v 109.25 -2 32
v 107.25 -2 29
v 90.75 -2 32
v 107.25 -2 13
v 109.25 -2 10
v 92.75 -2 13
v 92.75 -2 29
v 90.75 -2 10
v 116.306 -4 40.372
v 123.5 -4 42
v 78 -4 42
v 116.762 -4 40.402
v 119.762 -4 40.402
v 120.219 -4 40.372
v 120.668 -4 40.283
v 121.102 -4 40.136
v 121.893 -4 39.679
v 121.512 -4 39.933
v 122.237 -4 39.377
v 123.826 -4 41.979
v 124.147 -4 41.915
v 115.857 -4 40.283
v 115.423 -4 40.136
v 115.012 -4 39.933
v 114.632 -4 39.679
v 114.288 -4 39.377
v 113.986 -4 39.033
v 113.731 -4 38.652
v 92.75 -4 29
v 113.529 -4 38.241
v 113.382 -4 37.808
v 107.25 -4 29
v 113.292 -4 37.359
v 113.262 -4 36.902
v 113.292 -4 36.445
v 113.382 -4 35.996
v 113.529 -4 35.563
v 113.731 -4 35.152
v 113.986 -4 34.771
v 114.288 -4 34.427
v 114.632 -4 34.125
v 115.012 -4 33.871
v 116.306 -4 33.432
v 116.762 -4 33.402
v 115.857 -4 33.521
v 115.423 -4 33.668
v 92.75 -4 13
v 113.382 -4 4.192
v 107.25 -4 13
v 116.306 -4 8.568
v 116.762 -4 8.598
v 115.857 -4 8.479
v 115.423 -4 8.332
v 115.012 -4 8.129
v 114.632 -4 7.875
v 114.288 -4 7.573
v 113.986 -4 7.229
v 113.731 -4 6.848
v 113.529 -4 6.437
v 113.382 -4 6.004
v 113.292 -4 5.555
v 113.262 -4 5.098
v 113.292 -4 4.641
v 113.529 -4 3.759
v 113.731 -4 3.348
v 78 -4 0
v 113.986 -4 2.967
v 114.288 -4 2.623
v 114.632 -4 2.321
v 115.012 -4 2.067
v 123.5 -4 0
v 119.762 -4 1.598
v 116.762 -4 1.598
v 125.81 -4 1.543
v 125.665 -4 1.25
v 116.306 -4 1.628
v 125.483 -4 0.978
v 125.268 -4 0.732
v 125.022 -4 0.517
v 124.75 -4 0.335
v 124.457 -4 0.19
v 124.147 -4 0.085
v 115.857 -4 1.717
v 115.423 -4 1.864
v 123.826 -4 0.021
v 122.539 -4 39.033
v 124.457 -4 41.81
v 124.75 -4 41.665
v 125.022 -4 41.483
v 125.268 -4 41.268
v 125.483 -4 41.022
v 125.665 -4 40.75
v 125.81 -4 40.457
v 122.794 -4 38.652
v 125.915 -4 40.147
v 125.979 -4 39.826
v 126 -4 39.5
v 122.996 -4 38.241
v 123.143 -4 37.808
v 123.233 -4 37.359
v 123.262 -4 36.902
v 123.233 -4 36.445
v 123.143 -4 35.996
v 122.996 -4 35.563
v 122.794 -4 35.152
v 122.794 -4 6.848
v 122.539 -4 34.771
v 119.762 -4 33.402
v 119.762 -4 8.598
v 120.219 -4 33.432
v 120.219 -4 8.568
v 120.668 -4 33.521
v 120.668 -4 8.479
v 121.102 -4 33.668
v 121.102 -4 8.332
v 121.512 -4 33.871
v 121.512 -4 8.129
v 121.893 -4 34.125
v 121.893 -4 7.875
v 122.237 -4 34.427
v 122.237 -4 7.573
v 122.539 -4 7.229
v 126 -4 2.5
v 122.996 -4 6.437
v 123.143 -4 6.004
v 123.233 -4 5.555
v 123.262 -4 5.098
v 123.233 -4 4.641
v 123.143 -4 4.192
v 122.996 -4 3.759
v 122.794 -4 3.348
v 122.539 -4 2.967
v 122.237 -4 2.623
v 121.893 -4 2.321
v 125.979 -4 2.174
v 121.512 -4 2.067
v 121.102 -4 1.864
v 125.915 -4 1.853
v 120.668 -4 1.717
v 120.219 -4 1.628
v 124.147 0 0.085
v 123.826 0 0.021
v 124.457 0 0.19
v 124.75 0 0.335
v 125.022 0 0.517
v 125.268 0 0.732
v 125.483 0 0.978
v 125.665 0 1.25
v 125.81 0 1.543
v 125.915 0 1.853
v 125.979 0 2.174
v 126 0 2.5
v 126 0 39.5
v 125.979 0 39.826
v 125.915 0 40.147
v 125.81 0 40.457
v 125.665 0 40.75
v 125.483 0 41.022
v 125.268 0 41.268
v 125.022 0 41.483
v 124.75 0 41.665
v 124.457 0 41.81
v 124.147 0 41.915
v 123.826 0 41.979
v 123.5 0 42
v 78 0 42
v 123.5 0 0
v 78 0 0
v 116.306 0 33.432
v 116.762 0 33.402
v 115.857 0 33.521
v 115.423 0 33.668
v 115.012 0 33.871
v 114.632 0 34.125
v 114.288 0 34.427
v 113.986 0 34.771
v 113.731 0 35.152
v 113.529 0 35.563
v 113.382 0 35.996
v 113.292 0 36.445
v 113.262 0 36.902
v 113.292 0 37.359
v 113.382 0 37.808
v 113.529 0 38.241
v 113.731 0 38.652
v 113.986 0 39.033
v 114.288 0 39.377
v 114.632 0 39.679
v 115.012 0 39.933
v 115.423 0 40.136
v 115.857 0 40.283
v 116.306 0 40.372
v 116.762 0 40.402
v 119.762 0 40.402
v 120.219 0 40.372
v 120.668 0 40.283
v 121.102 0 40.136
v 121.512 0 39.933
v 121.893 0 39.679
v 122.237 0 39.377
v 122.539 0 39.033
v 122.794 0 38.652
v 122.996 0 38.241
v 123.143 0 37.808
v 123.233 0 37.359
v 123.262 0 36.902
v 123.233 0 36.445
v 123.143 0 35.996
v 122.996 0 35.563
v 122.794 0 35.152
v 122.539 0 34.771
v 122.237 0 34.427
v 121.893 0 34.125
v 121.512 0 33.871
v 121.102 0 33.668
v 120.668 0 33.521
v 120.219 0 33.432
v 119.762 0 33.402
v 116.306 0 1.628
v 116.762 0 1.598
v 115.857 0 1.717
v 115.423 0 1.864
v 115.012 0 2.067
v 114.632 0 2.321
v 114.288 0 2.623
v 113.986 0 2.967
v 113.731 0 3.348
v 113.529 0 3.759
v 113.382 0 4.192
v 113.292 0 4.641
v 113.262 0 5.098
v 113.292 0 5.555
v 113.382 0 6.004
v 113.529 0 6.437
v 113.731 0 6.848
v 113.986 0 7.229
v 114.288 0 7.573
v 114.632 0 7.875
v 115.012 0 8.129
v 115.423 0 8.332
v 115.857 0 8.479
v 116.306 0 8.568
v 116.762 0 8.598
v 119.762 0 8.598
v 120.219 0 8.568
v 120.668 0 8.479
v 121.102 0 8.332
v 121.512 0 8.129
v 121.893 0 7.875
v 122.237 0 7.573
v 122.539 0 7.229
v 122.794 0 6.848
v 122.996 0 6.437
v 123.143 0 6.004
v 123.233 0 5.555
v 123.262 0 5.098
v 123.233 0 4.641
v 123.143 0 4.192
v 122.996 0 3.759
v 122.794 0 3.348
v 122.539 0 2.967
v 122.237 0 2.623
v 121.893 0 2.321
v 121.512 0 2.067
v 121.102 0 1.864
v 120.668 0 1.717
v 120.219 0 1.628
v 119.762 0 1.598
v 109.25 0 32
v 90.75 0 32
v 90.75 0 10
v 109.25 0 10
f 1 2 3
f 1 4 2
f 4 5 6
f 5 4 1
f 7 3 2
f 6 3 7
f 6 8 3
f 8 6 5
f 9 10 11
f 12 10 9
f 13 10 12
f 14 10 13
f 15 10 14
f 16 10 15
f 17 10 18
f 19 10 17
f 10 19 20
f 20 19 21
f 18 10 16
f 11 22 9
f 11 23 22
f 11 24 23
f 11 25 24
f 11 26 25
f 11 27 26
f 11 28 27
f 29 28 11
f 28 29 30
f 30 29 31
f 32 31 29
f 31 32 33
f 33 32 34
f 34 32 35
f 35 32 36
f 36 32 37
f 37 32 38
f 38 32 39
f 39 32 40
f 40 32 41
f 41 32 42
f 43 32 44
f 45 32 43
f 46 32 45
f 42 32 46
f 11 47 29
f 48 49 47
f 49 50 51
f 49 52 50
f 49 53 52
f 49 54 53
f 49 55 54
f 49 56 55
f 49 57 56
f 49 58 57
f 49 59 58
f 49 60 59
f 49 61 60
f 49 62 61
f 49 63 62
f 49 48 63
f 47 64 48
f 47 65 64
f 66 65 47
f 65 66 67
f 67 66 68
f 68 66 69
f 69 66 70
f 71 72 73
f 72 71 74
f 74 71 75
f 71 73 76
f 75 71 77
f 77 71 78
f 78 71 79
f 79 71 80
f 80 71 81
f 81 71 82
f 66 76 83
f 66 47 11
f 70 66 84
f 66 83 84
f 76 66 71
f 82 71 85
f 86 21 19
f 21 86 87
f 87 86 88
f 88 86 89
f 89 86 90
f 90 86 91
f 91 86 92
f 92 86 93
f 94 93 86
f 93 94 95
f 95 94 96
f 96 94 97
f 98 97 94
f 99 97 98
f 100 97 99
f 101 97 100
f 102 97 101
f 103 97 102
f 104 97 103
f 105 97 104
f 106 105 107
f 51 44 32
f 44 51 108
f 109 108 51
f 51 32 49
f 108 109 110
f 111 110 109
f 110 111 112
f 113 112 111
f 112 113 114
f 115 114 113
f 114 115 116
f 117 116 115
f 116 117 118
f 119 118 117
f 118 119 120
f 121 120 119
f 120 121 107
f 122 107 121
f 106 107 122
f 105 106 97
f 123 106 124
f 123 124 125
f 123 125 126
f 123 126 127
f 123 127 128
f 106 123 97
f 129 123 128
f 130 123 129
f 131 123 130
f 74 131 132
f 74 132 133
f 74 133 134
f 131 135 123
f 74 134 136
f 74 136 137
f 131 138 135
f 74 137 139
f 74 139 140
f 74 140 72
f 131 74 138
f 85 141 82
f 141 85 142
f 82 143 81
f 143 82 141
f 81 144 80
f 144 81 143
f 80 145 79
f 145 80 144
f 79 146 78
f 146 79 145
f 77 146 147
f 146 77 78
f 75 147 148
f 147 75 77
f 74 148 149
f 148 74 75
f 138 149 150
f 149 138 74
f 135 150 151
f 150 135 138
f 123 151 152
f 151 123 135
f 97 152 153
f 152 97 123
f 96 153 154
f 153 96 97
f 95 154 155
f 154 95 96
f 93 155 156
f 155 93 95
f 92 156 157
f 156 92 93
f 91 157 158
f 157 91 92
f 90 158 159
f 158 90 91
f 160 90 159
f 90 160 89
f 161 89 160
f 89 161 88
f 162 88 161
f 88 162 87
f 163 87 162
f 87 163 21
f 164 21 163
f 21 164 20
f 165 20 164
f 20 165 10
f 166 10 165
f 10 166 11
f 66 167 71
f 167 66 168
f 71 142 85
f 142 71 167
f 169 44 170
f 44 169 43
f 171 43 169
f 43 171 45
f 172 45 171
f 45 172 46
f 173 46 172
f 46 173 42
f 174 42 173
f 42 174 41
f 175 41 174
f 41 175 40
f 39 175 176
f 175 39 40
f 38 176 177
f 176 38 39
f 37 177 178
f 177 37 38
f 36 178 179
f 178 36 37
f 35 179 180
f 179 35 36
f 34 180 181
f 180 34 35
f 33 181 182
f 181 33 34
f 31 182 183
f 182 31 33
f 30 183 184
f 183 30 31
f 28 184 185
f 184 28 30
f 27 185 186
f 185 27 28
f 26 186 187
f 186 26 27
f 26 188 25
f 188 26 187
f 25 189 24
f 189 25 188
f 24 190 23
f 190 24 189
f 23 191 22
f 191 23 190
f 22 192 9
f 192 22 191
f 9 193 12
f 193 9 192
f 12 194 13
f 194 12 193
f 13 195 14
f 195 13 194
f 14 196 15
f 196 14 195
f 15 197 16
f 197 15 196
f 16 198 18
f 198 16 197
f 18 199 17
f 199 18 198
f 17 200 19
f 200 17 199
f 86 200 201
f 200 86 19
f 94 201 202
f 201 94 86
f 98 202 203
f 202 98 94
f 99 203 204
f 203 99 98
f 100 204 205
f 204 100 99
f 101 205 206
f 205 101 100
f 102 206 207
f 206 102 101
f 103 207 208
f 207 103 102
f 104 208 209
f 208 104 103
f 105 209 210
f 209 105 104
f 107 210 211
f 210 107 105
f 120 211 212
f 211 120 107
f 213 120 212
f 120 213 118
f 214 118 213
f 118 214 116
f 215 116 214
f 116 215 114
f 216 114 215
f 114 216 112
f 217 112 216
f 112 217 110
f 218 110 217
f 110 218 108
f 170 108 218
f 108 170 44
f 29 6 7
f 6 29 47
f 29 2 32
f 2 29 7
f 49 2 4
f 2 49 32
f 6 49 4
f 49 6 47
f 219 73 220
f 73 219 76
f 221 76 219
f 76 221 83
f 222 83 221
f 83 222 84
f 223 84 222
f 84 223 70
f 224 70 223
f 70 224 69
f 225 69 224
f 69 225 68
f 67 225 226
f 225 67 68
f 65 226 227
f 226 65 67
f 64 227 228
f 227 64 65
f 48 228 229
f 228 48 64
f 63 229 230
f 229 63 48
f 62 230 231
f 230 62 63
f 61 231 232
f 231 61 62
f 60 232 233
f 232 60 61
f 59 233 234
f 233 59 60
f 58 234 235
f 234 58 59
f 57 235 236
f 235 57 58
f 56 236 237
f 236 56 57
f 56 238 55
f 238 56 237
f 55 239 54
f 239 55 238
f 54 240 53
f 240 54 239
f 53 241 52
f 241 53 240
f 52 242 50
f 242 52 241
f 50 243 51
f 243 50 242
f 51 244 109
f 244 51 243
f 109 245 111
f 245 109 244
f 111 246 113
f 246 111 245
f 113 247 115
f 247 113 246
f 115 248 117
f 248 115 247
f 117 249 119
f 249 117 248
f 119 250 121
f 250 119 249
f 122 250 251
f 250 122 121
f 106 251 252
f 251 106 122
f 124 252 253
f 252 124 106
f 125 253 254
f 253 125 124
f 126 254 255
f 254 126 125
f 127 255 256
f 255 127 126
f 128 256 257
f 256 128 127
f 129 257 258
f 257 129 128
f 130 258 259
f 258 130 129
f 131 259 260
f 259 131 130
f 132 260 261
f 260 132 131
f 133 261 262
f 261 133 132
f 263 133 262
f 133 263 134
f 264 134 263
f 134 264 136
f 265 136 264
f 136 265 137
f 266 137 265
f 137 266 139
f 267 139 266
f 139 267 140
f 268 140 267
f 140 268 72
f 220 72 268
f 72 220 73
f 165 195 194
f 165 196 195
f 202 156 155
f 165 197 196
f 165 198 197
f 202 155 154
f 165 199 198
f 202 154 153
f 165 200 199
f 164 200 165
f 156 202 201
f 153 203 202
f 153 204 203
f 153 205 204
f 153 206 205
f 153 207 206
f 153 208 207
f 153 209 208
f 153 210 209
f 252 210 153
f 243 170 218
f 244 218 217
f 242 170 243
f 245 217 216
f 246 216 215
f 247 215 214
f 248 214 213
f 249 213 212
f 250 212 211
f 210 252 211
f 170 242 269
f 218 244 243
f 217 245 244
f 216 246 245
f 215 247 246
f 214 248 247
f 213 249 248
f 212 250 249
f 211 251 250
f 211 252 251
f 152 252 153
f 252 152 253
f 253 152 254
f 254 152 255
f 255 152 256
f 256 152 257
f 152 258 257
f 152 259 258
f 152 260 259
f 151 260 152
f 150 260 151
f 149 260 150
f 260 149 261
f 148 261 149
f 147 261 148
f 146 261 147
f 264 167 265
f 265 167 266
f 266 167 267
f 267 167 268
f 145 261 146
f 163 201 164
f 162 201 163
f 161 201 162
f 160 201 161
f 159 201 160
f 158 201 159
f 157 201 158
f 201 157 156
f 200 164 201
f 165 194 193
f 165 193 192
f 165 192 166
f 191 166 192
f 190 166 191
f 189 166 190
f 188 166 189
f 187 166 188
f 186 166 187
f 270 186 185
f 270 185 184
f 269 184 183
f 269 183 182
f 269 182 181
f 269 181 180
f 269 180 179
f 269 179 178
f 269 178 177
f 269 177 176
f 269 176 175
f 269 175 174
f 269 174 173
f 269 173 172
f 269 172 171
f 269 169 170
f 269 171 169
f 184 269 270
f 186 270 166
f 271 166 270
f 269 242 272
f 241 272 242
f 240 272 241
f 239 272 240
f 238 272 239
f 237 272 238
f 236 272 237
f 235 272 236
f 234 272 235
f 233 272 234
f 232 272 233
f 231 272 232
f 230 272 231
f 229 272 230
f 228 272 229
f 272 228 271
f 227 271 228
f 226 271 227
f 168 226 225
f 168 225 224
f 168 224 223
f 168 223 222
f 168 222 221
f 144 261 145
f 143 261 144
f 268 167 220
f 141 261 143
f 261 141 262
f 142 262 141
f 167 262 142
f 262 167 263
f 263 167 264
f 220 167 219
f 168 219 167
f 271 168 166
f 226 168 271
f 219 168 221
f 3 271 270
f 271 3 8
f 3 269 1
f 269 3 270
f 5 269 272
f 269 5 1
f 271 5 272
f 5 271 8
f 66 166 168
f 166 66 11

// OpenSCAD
// Lab Rax generic equipment tray + faceplate (wizard template).
// Faceplate derived from the Pi4 baseline; rack holes follow the four-corner layout of the user-supplied
// 1U blank plate (faceplate_mounting.json): EVERY rack unit gets 4 holes, never a single centre pair.
// The wizard appends override assignments at the end of this file.
// PROPOSED, UNVALIDATED: printed fit, strength and rack clearance are UNKNOWN.
$fn=48;
part="assembly";            // assembly, faceplate, tray, combined, rear_bracket
// Device envelope (mm). Origin of hole coordinates = device front-left corner, seen from above.
dev_w=85; dev_d=56; dev_h=20;
holes=[];                   // [[x,y],...] mounting hole centres
hole_d=2.7;                 // device mounting hole diameter
device_mount="inserts";     // inserts, pegs, clips, straps
standoff=6;                 // device lift above tray floor
insert_pilot=3.2;           // pilot for heat-set insert (inserts mode)
board_t=1.6;                // board/flange thickness (pegs, clips)
joint="screw";              // screw, snap, single
u=1;                        // faceplate height in rack units
keystones=[];               // [x,...] keystone centres on faceplate (X=0 centre)
ks_w=14.5; ks_h=16;         // standard keystone opening
ports=[];                   // [[x,z,w,h,r],...] faceplate cut-outs, z from plate bottom, r=corner radius
front_gap=12;               // device front to faceplate rear face
margin=8;                   // tray border around device
rear_support=false;         // heavy/deep equipment: tray runs to the rear posts and screws to a rear bracket
coupon=[];                  // test coupon: [x0,x1,ymax] keeps only that slice of the part

// 4 mm plate (owner default 2026-10-18). Corner radius is limited by the four-corner holes:
// the reference holes sit 1.6 mm from the top/bottom edge, so larger corners would cut into them.
plate_w=252; plate_t=4; plate_r=2.5; plate_h=u*44.45-2.45;
hole_x=118.2625; hole_dz=15.902;   // each U: holes at its centre ±hole_dz (5.098 / 36.902 on a 1U plate)
rack_depth=240;             // Lab Rax frame depth (front of front posts to back of rear posts)
nudge=0;                    // render-repair only: tiny size offset applied when OpenSCAD 2021 emits a sliver
ks_front=2;                 // keystone clips need a thin wall: plate is pocketed from behind down to this
tray_t=3; tray_z=7;
tray_w=dev_w+2*margin; tray_d=rear_support?rack_depth:dev_d+front_gap+margin;
tray_x=-tray_w/2; tray_y=0;
dev_x=-dev_w/2; dev_y=front_gap; floor_top=tray_z+tray_t;
jx=min(40,tray_w/2-12); joint_x=[-jx,jx];
tongue_w=12; tongue_depth=7; tongue_h=3; tongue_z=tray_z+3.5;
slot_clear=0.3; boss_d=9; m3_clear=3.4; joint_pilot=4.0;  // 4.0 = the printed, well-fitting Pi4 trial

module capsule2d(len=10,diam=7){hull(){translate([-(len-diam)/2,0])circle(d=diam);translate([(len-diam)/2,0])circle(d=diam);}}
module rrect(w,h,r){rr=min(r,w/2-0.01,h/2-0.01);if(rr<=0)square([w,h],center=true);else offset(r=rr)square([w-2*rr,h-2*rr],center=true);}
// Mirror front-of-tray features to the rear (about the rack's mid-depth).
module to_rear(){translate([0,rack_depth/2,0])mirror([0,1,0])translate([0,-rack_depth/2,0])children();}

// Faceplate outline seen from the front: 2D X = rack X, 2D Y = height Z.
// rear=true cuts the larger keystone pocket; plain=true leaves out keystones/ports (rear bracket).
module plate2d(rear=false,plain=false){
 difference(){
  hull()for(sx=[-1,1],sz=[-1,1])translate([sx*(plate_w/2-plate_r),plate_h/2+sz*(plate_h/2-plate_r)])circle(r=plate_r+nudge);
  for(i=[0:u-1],dz=[-hole_dz,hole_dz],x=[-hole_x,hole_x])translate([x,i*44.45+21+dz])capsule2d();
  if(!plain){
   for(x=keystones)if(rear)translate([x,plate_h/2])square([ks_w+4+nudge,ks_h+6+nudge],center=true);
                   else translate([x,plate_h/2])square([ks_w,ks_h],center=true);
   for(p=ports)translate([p[0],p[1]])rrect(p[2],p[3],p[4]);
  }
 }
}
// Plate between y=y0 (front) and y0+t, built from the 2D outline (cleaner meshes than 3D cuts in OpenSCAD 2021).
module plate_layer(y0,t,rear=false,plain=false){translate([0,y0+t,0])rotate([90,0,0])linear_extrude(height=t)plate2d(rear,plain);}

module plate_joint_add(){
 if(joint=="screw"){
  for(x=joint_x)translate([x-tongue_w/2,0,tongue_z])cube([tongue_w,tongue_depth,tongue_h]);
  for(x=joint_x)translate([x,0,tray_z+14])rotate([-90,0,0])cylinder(d=boss_d,h=8);
 }
 if(joint=="snap") for(x=joint_x){
  // Cantilever arm under the tray floor; barb snaps up into a floor window.
  translate([x-4,0,tray_z-2])cube([8,16,2]);
  translate([x-4,12,tray_z])hull(){cube([8,4,0.01]);translate([0,3.4,0])cube([8,0.6,1.2]);}
 }
}
module plate_joint_cut(){if(joint=="screw")for(x=joint_x)translate([x,-0.1,tray_z+14])rotate([-90,0,0])cylinder(d=joint_pilot,h=8.2);}

module faceplate(){
 difference(){
  union(){
   // Front layer keeps the keystone opening; with keystones, the rear layer is pocketed so jacks grip ks_front.
   if(len(keystones)>0&&plate_t>ks_front){plate_layer(-plate_t,ks_front);plate_layer(-plate_t+ks_front,plate_t-ks_front,true);}
   else plate_layer(-plate_t,plate_t);
   plate_joint_add();
  }
  plate_joint_cut();
 }
}
// Plain plate on the rear posts (mirror of the faceplate, no openings) that the tray's rear end screws/snaps to.
module rear_bracket(){to_rear()difference(){union(){plate_layer(-plate_t,plate_t,false,true);plate_joint_add();}plate_joint_cut();}}

module device_features_add(){
 if(device_mount=="inserts")for(h=holes)translate([dev_x+h[0],dev_y+h[1],floor_top])cylinder(d=max(insert_pilot+3.5,7),h=standoff);
 if(device_mount=="pegs")for(h=holes)translate([dev_x+h[0],dev_y+h[1],floor_top]){
  cylinder(d=hole_d+3,h=standoff);
  translate([0,0,standoff])cylinder(d=hole_d-0.3,h=board_t+0.8);
  translate([0,0,standoff+board_t+0.8])cylinder(d1=hole_d-0.3,d2=hole_d-1,h=0.8);
 }
 if(device_mount=="clips"){
  // Support ledges at the four corners plus a flexing clip on each side.
  for(x=[dev_x-1,dev_x+dev_w-5],y=[dev_y-1,dev_y+dev_d-5])translate([x,y,floor_top])cube([6,6,standoff]);
  for(s=[-1,1])translate([s>0?dev_x+dev_w+0.2:dev_x-2.2,dev_y+dev_d/2-5,floor_top]){
   cube([2,10,standoff+board_t+2.5]);
   translate([s>0?-1.2:2,0,standoff+board_t+0.2])hull(){cube([1.2,10,1.6]);translate([s>0?1.2:0,0,1.6])cube([0.01,10,0.6]);}
  }
 }
}
module device_features_cut(){
 if(device_mount=="inserts")for(h=holes)translate([dev_x+h[0],dev_y+h[1],floor_top+0.01])cylinder(d=insert_pilot,h=standoff+0.1);
 if(device_mount=="straps")for(x=[dev_x-5.5,dev_x+dev_w+2.5],y=[dev_y+dev_d*0.25,dev_y+dev_d*0.75])
  translate([x,y-6,tray_z-0.1])cube([3,12,tray_t+0.2]);
}

module tray_joint_add(){
 if(joint=="screw"){
  for(x=joint_x) translate([x-9,0,tray_z+tray_t])cube([18,8,5]);
  for(x=joint_x)translate([x-7,8.3,tray_z+3])cube([14,3,19]);
  for(x=joint_x) for(side=[-1,1]) translate([x+side*6-1,0,0])
    hull(){translate([0,9,tray_z+2.7])cube([2,2,0.5]);
           translate([0,9,tray_z+8])cube([2,2,0.5]);
           translate([0,20,tray_z+2.7])cube([2,2,0.5]);}
 }
}
module tray_joint_cut(){
 if(joint=="screw"){
  for(x=joint_x)translate([x-(tongue_w+slot_clear)/2,-0.1,tongue_z-slot_clear/2])cube([tongue_w+slot_clear,tongue_depth+slot_clear,tongue_h+slot_clear]);
  for(x=joint_x)translate([x,11.4,tray_z+14])rotate([90,0,0])cylinder(d=m3_clear,h=12);
 }
 if(joint=="snap")for(x=joint_x)translate([x-4.3,14.8,tray_z-0.1])cube([8.6,1.6,tray_t+0.2]);
}

module tray(){
 difference(){
  union(){
   translate([tray_x,tray_y,tray_z])cube([tray_w,tray_d,tray_t]);
   tray_joint_add();
   if(rear_support)to_rear()tray_joint_add();
   device_features_add();
  }
  tray_joint_cut();
  if(rear_support)to_rear()tray_joint_cut();
  device_features_cut();
 }
}

module clip_coupon(){if(len(coupon)==3)intersection(){children();translate([coupon[0],-50,-50])cube([coupon[1]-coupon[0],coupon[2]+50,400]);}else children();}

clip_coupon(){
 if(part=="faceplate")faceplate();
 else if(part=="tray")tray();
 else if(part=="rear_bracket")rear_bracket();
 else if(part=="combined")union(){faceplate();translate([tray_x,-0.01,tray_z])cube([tray_w,0.02+0.01,tray_t]);tray();if(rear_support)rear_bracket();}
 else {color("steelblue")faceplate();color("silver")tray();if(rear_support)color("steelblue")rear_bracket();
  %translate([dev_x,dev_y,floor_top+(device_mount=="inserts"||device_mount=="pegs"||device_mount=="clips"?standoff:0)])cube([dev_w,dev_d,dev_h]);}
}

// ---- wizard overrides: 1_Keystone_and_corner_holes
dev_w=85.0;
dev_d=56.0;
dev_h=20.0;
hole_d=2.7;
standoff=6.0;
insert_pilot=3.2;
board_t=1.6;
u=1;
holes=[[3.5, 3.5], [61.5, 3.5], [3.5, 52.5], [61.5, 52.5]];
keystones=[100.0];
device_mount="inserts";
joint="screw";
rear_support=false;
coupon=[78.0, 127.0, 5.0];
ports=[];
